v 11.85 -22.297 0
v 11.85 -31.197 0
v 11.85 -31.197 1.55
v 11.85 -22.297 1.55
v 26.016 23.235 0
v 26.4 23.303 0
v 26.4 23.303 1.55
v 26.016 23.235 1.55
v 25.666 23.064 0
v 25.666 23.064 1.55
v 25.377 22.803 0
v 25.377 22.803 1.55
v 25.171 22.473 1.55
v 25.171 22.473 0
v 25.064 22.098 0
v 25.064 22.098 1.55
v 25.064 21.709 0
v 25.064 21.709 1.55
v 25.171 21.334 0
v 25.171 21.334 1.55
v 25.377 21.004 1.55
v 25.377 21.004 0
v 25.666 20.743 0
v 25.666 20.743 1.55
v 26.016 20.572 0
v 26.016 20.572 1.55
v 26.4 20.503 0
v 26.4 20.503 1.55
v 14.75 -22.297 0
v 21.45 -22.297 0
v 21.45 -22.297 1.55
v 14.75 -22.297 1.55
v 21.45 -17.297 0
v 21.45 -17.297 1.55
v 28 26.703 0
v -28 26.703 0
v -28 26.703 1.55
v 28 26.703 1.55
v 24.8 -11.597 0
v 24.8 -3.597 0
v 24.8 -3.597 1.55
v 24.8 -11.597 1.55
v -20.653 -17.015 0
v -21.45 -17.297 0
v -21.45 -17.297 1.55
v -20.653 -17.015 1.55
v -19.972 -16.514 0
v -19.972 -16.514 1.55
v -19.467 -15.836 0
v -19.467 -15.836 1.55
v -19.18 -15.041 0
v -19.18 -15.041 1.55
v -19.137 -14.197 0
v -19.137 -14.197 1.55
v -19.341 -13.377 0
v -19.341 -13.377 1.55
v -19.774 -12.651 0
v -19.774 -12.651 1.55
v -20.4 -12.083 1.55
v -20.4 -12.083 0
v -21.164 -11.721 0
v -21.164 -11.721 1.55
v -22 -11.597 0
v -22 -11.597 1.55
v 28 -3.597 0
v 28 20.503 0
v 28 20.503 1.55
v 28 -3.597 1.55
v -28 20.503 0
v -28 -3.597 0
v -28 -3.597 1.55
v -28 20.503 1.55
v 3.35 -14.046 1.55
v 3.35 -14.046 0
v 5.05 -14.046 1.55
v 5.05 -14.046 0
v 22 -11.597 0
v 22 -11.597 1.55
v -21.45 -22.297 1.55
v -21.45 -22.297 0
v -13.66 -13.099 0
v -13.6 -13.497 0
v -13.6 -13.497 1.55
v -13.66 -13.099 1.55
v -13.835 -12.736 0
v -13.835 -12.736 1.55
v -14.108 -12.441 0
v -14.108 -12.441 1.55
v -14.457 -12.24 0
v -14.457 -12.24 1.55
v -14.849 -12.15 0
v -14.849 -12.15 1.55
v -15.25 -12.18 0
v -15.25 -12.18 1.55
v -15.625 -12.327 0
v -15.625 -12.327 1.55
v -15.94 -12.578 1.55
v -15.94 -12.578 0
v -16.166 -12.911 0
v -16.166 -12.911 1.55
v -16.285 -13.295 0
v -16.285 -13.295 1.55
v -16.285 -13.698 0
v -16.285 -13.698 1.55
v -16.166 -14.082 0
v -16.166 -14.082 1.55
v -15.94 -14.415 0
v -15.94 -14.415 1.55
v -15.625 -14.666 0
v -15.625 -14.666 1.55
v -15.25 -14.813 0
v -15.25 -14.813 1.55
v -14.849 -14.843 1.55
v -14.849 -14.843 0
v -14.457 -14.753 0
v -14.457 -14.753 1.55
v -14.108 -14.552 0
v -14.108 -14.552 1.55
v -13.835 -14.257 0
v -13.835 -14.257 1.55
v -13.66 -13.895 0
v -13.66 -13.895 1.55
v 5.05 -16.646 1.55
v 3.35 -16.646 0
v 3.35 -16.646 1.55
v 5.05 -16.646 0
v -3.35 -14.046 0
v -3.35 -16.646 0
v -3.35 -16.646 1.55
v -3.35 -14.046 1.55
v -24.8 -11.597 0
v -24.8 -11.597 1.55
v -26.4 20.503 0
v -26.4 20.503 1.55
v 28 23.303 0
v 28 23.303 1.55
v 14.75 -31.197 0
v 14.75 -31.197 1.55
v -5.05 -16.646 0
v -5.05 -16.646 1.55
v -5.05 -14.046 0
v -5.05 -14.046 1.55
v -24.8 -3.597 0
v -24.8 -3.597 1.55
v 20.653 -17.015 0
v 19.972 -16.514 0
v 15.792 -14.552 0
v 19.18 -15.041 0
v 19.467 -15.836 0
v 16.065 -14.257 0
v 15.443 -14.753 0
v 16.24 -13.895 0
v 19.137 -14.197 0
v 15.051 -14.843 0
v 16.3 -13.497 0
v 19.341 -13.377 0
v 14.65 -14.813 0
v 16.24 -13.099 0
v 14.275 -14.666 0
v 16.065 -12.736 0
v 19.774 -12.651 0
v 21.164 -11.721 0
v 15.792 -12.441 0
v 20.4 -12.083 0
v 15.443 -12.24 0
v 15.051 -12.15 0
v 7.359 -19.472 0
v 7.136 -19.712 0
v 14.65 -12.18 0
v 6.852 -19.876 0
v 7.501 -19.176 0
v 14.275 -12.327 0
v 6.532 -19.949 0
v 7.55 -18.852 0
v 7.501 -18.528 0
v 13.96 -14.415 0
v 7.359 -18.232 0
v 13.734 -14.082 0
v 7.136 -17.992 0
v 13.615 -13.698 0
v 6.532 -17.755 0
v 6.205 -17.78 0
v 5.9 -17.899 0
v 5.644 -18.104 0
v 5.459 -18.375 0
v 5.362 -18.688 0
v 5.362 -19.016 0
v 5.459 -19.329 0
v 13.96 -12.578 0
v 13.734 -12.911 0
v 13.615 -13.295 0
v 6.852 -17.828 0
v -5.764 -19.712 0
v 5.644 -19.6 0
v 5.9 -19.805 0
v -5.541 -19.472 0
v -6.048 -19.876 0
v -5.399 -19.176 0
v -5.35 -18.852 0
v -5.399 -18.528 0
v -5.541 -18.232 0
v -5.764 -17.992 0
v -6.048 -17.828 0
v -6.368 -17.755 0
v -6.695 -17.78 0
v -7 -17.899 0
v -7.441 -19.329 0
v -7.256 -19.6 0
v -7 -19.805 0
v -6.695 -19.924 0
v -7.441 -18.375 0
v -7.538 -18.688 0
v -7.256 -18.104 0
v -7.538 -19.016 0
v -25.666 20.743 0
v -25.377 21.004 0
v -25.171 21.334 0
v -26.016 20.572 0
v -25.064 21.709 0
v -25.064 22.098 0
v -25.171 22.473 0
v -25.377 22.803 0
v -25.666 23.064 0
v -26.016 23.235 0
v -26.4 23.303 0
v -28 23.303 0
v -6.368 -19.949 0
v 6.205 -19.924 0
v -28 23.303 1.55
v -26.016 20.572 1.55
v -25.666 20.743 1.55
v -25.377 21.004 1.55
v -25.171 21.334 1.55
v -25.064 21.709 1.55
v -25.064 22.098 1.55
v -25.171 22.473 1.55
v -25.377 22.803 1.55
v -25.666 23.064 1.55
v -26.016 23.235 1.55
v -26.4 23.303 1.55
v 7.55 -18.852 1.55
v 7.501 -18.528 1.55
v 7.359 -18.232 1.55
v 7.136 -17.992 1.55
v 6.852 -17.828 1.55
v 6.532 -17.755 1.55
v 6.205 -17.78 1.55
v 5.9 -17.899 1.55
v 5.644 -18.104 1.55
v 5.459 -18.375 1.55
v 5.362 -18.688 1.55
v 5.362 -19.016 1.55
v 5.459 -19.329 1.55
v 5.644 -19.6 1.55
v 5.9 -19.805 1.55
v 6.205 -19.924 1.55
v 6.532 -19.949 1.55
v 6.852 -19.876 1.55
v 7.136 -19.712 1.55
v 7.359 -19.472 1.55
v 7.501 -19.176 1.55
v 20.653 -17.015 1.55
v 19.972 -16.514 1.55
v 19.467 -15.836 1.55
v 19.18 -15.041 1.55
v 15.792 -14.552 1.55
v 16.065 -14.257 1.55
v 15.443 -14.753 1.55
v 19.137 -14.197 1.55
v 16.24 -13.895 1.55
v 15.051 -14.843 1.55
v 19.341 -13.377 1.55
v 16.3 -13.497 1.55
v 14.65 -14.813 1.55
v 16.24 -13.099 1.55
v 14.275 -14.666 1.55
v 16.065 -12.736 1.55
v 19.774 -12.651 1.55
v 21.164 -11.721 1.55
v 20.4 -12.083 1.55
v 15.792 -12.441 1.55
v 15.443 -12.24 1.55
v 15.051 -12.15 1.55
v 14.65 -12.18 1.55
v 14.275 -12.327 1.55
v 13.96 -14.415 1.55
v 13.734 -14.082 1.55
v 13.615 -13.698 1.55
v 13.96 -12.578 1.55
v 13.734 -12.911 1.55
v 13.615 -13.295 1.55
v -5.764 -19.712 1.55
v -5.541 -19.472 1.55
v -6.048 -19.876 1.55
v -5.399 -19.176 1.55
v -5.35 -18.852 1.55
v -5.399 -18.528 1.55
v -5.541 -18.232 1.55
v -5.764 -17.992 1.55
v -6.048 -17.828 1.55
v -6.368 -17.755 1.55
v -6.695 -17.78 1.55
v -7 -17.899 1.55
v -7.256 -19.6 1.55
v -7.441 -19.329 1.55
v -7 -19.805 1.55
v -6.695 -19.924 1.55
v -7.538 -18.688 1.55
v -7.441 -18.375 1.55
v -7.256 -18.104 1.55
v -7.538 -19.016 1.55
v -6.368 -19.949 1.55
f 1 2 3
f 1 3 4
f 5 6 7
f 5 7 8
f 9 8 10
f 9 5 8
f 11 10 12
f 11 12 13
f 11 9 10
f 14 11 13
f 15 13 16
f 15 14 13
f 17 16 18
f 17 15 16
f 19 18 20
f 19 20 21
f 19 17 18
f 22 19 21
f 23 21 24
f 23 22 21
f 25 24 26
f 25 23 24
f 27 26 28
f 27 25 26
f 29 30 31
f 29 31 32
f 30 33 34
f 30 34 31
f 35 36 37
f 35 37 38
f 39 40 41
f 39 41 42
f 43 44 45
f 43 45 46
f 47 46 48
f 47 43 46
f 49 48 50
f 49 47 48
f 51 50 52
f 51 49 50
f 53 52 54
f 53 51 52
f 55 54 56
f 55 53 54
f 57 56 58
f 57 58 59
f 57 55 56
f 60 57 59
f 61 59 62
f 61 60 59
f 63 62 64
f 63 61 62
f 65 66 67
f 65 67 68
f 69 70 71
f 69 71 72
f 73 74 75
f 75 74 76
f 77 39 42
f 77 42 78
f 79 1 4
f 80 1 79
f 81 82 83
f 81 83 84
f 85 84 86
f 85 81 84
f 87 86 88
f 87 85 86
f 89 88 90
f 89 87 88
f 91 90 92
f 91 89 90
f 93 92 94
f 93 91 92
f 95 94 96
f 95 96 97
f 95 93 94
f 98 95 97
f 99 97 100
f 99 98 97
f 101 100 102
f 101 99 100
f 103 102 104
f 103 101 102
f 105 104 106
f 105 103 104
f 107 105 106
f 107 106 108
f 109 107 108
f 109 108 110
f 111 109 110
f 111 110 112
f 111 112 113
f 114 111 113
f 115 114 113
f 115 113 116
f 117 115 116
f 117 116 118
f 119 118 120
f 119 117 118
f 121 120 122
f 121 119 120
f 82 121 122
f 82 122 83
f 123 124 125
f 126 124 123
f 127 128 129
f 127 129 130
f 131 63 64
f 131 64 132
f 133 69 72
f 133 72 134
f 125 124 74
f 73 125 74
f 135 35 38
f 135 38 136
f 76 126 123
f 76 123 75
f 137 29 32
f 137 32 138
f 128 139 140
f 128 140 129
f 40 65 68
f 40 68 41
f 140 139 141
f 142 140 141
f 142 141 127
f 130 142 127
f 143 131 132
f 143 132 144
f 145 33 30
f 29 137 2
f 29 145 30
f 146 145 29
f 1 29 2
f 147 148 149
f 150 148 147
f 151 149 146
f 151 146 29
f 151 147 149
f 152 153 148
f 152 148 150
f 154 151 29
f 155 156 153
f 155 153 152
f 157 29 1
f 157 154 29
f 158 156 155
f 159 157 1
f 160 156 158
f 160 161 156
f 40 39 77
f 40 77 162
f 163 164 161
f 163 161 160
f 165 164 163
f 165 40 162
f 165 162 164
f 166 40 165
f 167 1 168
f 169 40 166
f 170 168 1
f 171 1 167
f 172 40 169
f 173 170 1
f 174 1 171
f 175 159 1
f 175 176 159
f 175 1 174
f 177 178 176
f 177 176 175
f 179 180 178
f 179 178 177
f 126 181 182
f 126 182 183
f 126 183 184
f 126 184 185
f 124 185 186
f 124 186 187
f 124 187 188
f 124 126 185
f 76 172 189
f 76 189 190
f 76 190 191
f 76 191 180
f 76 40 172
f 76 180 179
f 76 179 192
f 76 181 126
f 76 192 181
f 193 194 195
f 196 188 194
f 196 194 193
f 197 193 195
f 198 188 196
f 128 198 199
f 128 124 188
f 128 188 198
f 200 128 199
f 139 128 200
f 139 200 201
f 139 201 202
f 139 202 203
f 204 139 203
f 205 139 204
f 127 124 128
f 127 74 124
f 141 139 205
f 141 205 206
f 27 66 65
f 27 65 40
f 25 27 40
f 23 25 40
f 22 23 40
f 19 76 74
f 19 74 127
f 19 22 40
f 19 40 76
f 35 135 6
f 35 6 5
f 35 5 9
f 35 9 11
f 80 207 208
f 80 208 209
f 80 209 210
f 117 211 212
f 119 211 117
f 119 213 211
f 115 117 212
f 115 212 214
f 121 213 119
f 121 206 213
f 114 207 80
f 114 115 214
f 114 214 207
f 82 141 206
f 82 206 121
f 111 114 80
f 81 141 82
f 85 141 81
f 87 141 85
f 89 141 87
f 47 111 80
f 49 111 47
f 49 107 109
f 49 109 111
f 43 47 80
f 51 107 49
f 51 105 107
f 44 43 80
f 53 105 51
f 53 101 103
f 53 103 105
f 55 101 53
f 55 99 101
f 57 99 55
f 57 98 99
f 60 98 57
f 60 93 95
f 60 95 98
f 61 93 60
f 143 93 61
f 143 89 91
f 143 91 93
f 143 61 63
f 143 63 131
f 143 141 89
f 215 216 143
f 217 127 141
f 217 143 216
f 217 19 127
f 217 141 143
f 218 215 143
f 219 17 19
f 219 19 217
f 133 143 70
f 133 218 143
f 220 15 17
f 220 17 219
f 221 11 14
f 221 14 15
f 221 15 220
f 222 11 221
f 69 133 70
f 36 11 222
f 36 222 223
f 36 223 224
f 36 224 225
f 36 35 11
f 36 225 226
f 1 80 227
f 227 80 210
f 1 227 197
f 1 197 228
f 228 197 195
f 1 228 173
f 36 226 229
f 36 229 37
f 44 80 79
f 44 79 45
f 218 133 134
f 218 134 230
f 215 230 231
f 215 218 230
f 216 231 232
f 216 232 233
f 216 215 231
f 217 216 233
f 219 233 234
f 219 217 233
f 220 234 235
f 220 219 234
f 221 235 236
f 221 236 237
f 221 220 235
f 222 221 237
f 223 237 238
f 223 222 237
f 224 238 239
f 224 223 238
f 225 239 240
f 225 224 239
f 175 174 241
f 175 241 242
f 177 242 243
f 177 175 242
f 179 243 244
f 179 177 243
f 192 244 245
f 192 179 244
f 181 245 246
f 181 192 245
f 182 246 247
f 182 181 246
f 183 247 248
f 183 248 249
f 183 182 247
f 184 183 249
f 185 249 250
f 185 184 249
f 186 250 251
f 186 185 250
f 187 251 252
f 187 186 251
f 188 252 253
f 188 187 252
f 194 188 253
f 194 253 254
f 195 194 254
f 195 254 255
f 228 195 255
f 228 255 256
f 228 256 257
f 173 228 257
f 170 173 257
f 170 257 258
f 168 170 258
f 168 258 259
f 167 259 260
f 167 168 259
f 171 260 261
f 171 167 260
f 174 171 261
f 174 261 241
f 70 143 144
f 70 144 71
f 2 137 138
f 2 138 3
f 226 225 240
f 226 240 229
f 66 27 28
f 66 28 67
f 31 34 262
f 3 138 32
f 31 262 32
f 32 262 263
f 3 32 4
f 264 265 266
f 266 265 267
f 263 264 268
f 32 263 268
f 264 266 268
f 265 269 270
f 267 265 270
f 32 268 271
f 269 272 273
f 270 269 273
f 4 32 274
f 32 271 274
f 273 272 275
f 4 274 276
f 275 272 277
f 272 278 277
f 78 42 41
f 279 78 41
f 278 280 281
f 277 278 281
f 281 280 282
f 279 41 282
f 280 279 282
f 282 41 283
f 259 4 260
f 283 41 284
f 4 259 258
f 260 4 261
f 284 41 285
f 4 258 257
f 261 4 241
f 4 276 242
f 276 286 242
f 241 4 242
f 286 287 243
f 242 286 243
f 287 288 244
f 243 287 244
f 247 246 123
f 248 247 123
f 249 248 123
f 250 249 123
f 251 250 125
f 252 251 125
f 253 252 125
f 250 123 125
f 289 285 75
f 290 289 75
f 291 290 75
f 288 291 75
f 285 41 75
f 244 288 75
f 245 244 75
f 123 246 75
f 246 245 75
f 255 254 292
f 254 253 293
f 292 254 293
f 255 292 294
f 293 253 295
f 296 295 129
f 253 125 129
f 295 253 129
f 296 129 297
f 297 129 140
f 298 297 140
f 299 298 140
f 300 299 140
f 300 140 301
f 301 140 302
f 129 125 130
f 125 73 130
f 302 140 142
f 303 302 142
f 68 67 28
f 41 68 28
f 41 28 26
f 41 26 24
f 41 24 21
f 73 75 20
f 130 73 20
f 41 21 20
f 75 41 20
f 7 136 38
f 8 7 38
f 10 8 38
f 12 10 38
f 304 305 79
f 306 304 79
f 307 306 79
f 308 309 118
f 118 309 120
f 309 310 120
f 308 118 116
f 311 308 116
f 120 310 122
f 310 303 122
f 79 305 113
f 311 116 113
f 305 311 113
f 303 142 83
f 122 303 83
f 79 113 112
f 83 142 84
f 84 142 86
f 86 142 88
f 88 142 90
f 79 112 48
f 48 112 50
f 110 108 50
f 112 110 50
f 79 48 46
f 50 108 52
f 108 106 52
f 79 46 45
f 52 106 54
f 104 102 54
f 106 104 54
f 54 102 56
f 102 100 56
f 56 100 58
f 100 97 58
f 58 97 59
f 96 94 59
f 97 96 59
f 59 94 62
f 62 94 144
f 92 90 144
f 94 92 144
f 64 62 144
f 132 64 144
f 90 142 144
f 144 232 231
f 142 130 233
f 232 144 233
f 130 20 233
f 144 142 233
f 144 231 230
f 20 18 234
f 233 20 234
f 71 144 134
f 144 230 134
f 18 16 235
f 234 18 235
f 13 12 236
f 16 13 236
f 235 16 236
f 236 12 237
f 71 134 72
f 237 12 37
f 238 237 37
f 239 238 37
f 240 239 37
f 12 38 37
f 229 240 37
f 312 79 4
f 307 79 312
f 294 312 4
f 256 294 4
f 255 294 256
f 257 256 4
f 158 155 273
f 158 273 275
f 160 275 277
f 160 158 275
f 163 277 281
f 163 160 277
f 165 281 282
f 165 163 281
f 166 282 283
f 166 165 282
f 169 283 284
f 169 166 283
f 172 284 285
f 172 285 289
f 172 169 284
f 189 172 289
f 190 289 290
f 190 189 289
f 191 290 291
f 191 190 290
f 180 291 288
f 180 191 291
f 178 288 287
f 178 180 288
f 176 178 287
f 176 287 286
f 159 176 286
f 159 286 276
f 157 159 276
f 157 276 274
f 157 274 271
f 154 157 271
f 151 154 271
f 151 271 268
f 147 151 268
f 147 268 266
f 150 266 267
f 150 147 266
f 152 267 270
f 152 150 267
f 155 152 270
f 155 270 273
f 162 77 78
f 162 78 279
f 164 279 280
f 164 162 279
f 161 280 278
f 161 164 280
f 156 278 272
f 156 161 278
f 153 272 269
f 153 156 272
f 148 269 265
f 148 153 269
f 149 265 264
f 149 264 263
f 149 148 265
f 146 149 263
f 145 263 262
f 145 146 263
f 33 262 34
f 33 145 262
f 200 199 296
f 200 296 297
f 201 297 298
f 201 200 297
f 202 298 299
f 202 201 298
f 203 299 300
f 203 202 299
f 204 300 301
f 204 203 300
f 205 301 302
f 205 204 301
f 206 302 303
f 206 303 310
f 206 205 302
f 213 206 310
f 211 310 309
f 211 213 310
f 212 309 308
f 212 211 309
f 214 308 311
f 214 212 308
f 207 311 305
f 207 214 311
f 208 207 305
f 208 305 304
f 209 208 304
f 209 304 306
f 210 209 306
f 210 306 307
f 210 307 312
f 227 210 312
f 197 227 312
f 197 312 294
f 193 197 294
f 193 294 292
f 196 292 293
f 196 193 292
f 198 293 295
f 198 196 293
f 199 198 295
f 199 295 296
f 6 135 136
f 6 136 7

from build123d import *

# Parameters (mm, degrees)
SKIZZE1_R                       = 1.35
SKIZZE1_R_2                     = 1.1
SKIZZE1_W                       = 1.7
SKIZZE1_H                       = 2.6
AUFSATZ_LINEAR_AUSTRAGEN1_DEPTH = 1.55


with BuildPart() as part:
    # Skizze1 → Aufsatz-Linear austragen1 (new body)
    with BuildSketch(Plane.XY):
        with BuildLine():
            Line((-28, 23.303403096), (-28, 26.703403096))
            Line((-28, 26.703403096), (28, 26.703403096))
            Line((28, 26.703403096), (28, 23.303403096))
            Line((28, 23.303403096), (26.4, 23.303403096))
            ThreePointArc((26.4, 23.303403096), (25.05, 21.903403096), (26.4, 20.503403096))
            Line((26.4, 20.503403096), (28, 20.503403096))
            Line((28, 20.503403096), (28, -3.596596904))
            Line((28, -3.596596904), (24.8, -3.596596904))
            Line((24.8, -3.596596904), (24.8, -11.596596904))
            Line((24.8, -11.596596904), (22, -11.596596904))
            ThreePointArc((22, -11.596596904), (19.136763195, -14.196854756), (21.45, -17.296596904))
            Line((21.45, -17.296596904), (21.45, -22.296596904))
            Line((21.45, -22.296596904), (14.75, -22.296596904))
            Line((14.75, -22.296596904), (14.75, -31.196596904))
            Line((14.75, -31.196596904), (11.85, -31.196596904))
            Line((11.85, -31.196596904), (11.85, -22.296596904))
            Line((11.85, -22.296596904), (-21.45, -22.296596904))
            Line((-21.45, -22.296596904), (-21.45, -17.296596904))
            ThreePointArc((-21.45, -17.296596904), (-19.136763195, -14.196854756), (-22, -11.596596904))
            Line((-22, -11.596596904), (-24.8, -11.596596904))
            Line((-24.8, -11.596596904), (-24.8, -3.596596904))
            Line((-24.8, -3.596596904), (-28, -3.596596904))
            Line((-28, -3.596596904), (-28, 20.503403096))
            Line((-28, 20.503403096), (-26.4, 20.503403096))
            ThreePointArc((-26.4, 20.503403096), (-25.05, 21.903403096), (-26.4, 23.303403096))
            Line((-26.4, 23.303403096), (-28, 23.303403096))
        make_face()
        with Locations((14.95, -13.496596904)):
            Circle(SKIZZE1_R, mode=Mode.SUBTRACT)
        with Locations((-14.95, -13.496596904)):
            Circle(SKIZZE1_R, mode=Mode.SUBTRACT)
        with Locations((6.45, -18.852047487)):
            Circle(SKIZZE1_R_2, mode=Mode.SUBTRACT)
        with Locations((-6.45, -18.852047487)):
            Circle(SKIZZE1_R_2, mode=Mode.SUBTRACT)
        with Locations((-4.2, -15.345681582)):
            Rectangle(SKIZZE1_W, SKIZZE1_H, mode=Mode.SUBTRACT)
        with Locations((4.2, -15.345681582)):
            Rectangle(SKIZZE1_W, SKIZZE1_H, mode=Mode.SUBTRACT)
    extrude(amount=AUFSATZ_LINEAR_AUSTRAGEN1_DEPTH)


solid = part.part
